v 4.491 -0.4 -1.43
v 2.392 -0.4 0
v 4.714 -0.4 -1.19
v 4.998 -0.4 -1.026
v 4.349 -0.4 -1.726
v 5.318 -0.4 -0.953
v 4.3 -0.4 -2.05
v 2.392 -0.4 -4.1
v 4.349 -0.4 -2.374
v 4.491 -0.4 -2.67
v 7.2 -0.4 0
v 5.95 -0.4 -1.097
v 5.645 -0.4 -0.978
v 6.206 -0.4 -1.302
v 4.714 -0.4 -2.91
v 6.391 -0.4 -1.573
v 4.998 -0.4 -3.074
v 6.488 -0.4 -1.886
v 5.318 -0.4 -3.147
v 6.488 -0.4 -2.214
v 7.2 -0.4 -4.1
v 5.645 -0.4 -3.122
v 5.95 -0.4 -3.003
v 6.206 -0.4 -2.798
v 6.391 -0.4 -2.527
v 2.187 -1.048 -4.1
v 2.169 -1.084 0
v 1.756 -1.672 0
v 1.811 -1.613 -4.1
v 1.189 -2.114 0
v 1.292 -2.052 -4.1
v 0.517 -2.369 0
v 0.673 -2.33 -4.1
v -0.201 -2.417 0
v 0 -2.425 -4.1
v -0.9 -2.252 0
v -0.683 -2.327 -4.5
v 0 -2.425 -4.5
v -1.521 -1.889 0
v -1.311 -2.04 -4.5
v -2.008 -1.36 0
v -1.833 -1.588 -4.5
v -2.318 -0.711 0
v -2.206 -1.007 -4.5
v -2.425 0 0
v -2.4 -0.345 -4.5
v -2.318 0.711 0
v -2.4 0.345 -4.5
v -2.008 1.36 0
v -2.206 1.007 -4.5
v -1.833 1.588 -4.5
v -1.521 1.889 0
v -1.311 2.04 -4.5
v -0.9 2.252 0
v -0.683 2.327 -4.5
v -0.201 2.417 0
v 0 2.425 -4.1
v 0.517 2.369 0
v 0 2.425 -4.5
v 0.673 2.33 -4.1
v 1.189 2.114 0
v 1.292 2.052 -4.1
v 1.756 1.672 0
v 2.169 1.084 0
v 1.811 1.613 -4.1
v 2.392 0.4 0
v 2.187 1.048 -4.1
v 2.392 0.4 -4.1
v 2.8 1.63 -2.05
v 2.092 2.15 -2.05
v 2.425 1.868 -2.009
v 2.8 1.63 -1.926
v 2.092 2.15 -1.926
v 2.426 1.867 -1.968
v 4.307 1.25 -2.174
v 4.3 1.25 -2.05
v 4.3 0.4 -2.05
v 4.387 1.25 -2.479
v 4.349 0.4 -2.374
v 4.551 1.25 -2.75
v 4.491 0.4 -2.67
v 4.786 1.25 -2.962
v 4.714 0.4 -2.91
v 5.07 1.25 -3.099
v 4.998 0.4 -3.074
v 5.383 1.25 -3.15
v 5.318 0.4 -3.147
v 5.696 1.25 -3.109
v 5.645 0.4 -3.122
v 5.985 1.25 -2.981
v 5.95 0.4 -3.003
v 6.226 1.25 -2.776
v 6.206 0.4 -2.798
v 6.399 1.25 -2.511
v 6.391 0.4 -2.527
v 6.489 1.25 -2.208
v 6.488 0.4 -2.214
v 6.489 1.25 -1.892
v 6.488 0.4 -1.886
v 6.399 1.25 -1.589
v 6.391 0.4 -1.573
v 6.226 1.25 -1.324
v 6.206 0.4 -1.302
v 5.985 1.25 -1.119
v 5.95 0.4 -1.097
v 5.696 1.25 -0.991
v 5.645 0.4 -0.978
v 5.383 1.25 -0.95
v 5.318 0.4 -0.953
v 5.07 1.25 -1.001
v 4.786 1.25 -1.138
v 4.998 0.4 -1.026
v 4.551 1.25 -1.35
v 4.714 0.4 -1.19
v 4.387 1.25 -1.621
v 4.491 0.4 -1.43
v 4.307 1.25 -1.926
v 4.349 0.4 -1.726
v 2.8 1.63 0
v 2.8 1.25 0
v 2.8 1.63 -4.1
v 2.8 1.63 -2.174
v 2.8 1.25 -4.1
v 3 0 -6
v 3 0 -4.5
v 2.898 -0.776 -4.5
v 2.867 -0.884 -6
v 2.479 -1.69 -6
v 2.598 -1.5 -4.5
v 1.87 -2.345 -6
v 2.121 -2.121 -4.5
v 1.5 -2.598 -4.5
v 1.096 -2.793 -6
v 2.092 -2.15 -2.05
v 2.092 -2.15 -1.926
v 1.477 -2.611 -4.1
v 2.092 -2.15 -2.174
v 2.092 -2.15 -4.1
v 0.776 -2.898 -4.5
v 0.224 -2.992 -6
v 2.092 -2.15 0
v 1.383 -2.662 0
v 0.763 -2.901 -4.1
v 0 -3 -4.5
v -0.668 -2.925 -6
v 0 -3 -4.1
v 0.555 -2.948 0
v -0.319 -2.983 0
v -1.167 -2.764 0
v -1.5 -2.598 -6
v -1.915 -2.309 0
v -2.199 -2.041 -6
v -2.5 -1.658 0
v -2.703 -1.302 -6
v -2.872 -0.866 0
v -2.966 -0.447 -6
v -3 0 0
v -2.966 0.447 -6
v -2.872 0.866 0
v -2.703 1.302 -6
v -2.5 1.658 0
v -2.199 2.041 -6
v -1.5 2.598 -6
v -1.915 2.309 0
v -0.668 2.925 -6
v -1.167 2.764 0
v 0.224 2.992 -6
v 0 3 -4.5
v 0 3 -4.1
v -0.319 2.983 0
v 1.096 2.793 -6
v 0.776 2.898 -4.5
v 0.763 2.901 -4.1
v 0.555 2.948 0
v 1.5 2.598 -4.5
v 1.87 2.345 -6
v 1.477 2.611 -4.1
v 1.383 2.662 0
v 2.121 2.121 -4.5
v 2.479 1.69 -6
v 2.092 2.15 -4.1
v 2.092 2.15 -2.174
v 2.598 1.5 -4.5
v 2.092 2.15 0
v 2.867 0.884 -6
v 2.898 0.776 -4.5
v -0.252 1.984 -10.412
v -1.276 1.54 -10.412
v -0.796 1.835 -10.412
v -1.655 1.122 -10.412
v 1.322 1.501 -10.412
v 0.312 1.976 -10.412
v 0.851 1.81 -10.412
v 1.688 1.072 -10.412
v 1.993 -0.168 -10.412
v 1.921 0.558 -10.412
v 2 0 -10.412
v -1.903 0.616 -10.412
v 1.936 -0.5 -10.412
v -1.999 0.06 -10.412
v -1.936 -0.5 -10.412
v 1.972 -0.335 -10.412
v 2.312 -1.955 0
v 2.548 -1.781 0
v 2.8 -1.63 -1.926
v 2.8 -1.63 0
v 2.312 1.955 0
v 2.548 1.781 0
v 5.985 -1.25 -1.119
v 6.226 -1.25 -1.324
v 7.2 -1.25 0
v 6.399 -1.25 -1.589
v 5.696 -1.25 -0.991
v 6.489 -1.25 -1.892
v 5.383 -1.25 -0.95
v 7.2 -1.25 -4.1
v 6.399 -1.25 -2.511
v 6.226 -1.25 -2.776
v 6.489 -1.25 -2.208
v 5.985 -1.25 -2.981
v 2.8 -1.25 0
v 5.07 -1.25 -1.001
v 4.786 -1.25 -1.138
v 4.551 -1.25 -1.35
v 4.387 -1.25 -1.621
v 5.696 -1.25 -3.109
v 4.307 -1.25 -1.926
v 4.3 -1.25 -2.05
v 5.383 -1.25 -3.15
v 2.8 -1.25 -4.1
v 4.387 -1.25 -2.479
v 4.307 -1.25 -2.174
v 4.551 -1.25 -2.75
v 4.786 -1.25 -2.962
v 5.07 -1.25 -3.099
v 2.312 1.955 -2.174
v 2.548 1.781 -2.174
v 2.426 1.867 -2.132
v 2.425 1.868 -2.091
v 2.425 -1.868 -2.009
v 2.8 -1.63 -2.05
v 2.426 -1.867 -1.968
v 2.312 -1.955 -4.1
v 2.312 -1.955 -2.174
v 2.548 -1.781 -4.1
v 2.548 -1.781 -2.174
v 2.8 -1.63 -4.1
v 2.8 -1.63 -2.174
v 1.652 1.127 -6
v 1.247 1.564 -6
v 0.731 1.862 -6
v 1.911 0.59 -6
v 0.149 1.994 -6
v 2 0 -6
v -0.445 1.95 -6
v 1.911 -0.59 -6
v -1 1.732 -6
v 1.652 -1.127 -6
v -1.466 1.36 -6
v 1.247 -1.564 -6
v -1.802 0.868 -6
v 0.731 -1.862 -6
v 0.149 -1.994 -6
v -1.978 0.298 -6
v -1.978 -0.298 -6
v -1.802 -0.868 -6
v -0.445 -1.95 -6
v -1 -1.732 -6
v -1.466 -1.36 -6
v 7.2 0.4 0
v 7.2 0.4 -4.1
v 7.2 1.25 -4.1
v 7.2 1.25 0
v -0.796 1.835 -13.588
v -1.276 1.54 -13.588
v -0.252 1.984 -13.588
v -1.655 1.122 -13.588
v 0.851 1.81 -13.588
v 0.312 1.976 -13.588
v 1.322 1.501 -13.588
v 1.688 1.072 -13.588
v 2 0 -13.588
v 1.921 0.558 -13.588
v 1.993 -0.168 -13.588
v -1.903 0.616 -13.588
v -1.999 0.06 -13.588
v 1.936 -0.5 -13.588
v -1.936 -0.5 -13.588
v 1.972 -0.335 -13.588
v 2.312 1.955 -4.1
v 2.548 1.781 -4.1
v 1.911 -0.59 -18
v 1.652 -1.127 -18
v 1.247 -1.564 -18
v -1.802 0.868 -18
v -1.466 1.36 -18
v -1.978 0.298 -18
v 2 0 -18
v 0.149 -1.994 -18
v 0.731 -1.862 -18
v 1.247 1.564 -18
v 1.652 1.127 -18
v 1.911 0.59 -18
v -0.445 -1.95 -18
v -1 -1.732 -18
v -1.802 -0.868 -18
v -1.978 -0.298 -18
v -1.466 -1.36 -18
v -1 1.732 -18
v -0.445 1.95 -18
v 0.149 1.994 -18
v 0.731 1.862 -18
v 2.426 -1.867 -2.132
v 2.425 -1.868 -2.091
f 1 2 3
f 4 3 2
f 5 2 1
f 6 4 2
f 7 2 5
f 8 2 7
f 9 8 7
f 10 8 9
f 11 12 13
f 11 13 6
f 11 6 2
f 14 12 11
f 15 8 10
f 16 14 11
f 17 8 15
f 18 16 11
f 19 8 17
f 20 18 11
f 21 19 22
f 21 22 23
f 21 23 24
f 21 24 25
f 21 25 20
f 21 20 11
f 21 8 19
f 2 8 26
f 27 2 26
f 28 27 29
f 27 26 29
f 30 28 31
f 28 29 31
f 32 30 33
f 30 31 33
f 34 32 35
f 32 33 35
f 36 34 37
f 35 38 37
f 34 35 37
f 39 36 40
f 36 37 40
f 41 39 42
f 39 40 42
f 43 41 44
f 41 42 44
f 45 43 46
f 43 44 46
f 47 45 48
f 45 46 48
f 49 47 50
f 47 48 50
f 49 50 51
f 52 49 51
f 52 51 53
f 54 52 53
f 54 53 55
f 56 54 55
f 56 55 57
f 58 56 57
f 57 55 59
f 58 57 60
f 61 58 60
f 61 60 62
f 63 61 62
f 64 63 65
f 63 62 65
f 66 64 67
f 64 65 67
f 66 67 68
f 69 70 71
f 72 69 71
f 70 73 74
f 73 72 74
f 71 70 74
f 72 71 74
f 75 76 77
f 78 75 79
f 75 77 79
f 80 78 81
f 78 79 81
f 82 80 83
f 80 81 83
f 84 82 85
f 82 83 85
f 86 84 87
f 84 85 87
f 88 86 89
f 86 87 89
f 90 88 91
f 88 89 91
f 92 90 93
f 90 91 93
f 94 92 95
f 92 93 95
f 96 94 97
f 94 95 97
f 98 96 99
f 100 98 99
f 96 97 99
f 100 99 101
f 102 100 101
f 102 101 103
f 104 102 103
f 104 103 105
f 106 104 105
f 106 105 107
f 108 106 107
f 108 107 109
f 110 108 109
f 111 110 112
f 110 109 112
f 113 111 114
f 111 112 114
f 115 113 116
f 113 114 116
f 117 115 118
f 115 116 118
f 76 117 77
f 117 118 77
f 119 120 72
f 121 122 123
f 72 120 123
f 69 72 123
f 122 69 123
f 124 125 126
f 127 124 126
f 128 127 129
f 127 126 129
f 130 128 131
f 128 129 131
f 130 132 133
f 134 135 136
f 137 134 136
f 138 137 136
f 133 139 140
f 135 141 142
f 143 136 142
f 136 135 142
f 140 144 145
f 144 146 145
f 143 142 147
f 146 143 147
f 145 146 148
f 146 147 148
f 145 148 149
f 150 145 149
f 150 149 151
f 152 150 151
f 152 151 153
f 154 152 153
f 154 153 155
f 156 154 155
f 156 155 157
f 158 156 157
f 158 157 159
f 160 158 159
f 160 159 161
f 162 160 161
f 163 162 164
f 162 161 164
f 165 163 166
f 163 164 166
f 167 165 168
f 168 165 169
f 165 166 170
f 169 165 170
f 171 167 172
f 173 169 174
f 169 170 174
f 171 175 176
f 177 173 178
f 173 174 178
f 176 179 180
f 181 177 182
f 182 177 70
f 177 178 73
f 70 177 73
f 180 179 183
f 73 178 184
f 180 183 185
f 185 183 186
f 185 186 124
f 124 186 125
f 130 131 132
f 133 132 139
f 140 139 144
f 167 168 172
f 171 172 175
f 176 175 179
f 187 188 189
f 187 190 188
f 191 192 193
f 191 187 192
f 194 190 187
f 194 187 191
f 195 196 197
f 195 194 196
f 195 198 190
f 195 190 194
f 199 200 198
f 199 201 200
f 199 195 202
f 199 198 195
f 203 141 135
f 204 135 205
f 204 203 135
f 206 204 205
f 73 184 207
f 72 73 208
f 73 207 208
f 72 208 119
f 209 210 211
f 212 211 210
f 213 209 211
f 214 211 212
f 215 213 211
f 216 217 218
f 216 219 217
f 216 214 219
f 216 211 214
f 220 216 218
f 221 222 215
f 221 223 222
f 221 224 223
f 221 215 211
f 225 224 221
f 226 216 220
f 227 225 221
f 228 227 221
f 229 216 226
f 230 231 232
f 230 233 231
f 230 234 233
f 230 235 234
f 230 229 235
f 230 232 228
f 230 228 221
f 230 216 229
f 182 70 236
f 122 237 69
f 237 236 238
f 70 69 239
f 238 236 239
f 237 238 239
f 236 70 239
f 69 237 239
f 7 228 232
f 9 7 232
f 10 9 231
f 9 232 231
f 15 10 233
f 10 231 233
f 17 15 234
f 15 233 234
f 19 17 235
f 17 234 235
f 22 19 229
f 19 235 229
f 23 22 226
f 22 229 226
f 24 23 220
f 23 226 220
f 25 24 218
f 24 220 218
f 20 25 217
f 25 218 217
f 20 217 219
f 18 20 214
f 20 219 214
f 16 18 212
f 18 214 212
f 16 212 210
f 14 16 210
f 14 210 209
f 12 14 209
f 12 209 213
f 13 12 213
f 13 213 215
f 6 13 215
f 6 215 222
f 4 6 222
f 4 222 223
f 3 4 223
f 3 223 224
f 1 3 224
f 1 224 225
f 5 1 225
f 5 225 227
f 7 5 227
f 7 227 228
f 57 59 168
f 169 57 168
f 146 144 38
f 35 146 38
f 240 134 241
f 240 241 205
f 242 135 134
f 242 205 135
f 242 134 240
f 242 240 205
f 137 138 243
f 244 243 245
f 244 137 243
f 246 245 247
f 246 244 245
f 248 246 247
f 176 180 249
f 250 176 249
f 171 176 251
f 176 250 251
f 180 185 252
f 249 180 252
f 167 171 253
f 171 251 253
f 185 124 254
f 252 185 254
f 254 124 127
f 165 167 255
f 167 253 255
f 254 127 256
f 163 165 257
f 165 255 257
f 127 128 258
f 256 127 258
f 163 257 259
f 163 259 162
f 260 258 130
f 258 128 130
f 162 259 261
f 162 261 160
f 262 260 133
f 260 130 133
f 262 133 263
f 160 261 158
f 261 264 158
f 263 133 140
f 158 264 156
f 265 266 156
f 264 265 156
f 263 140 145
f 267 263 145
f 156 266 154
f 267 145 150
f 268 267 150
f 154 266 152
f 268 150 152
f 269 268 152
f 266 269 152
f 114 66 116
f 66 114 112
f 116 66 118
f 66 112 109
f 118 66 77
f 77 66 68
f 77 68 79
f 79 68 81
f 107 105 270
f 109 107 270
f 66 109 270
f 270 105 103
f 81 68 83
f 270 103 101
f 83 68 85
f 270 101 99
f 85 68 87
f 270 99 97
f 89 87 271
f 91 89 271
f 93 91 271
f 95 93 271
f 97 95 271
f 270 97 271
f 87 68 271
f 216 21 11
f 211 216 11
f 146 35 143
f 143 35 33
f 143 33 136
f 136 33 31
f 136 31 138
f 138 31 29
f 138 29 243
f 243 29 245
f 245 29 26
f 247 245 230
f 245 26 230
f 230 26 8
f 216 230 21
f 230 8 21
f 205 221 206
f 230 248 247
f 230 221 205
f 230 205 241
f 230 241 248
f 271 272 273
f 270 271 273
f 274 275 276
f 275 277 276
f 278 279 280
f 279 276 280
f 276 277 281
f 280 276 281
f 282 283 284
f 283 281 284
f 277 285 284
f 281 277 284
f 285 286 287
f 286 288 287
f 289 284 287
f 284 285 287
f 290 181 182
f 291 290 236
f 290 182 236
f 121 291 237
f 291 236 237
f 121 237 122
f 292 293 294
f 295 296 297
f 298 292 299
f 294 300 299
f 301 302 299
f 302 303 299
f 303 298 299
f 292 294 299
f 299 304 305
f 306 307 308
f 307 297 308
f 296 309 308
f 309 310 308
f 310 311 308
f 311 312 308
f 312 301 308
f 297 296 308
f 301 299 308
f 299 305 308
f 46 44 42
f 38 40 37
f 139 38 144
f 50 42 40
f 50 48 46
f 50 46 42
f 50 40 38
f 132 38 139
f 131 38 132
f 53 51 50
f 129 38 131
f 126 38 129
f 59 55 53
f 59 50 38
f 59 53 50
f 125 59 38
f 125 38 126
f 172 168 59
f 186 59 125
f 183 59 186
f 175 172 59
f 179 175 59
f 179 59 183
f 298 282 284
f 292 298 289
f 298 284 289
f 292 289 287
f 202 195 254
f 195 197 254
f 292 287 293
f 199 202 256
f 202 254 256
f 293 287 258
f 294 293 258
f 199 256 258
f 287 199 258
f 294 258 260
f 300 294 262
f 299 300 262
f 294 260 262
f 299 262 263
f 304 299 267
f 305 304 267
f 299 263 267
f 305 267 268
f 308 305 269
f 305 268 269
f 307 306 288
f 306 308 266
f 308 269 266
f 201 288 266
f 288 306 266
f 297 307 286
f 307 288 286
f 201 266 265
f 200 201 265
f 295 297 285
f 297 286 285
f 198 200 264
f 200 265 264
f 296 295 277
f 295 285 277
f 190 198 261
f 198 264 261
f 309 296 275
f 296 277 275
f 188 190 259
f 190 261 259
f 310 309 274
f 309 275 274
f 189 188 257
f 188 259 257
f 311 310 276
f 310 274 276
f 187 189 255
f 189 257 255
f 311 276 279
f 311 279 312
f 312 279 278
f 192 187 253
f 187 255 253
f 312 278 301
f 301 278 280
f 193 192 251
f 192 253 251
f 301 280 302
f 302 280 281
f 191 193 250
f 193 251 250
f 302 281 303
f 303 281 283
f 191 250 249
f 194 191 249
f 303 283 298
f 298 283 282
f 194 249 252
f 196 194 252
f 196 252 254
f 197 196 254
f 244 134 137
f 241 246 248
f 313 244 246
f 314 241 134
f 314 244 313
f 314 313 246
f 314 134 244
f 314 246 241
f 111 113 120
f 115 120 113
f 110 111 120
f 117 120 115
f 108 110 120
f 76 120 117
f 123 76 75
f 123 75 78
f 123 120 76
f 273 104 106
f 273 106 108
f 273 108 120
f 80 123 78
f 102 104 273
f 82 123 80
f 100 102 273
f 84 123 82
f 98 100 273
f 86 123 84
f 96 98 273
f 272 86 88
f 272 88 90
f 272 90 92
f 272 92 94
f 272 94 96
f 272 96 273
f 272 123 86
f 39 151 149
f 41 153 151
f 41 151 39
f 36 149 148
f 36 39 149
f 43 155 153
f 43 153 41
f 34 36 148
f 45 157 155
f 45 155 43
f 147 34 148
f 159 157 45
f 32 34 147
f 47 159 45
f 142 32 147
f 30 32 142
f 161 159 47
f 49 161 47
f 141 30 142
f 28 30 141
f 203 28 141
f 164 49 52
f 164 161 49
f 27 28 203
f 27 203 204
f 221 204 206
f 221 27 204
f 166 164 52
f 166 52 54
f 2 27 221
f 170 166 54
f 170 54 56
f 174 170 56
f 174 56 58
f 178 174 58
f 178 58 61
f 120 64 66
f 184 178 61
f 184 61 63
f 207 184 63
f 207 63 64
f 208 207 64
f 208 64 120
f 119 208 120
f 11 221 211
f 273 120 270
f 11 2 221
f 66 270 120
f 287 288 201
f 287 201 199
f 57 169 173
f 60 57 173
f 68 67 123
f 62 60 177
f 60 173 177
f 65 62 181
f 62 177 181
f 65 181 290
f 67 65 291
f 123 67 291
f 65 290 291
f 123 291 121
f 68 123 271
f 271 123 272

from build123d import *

# Parameters (mm, degrees)
BOSS_EXTRUDE3_DEPTH     = 1.25
SKETCH6_W               = 7.2
SKETCH6_H               = 4.5
CUT_EXTRUDE1_DEPTH      = 0.4
CUT_EXTRUDE2_START      = -4.5
SKETCH7_W               = 8
SKETCH7_H               = 10
CUT_EXTRUDE2_DEPTH      = 0.4
M2_CLEARANCE_HOLE1_D    = 2.2
CUT_EXTRUDE3_DEPTH      = 20.617339269
CUT_EXTRUDE3_DEPTH_BACK = 0.5
SKETCH10_W              = 10
SKETCH10_H              = 3.175
FILLET1_R               = 3.175
CUT_EXTRUDE4_REACH      = 21.847
CUT_EXTRUDE4_END_RADIUS = 3.175
SKETCH12_W              = 4.4
SKETCH12_H              = 4.1


with BuildPart() as part:
    # Sketch3 → Revolve1 (revolve)
    with BuildSketch(Plane(origin=(0, 0, 0), x_dir=(0, 0, -1), z_dir=(1, 0, 0)), mode=Mode.PRIVATE) as revolve1_sk:
        Polygon((18, 0), (18, 2), (6, 2), (6, 3), (0, 3), (0, 2.425), (4.5, 2.425), (4.5, 0), align=None)
    revolve(revolve1_sk.sketch.rotate(Axis((0, 0, 12.785862786), (0, 0, -1)), 90), axis=Axis((0, 0, 12.785862786), (0, 0, -1)))

    # Sketch5 → Boss-Extrude3 (add, symmetric)
    with BuildSketch(Plane(origin=(0, 0, 0), x_dir=(1, 0, 0), z_dir=(0, 1, 0))):
        Polygon((3, 4.5), (7.2, 4.5), (7.2, 0), (3, 0), (2.425, 0), (2.425, 4.5), align=None)
    extrude(amount=BOSS_EXTRUDE3_DEPTH, both=True)

    # Sketch6 → Cut-Extrude1 (cut, symmetric)
    with BuildSketch(Plane(origin=(0, 0, 0), x_dir=(1, 0, 0), z_dir=(0, 1, 0))):
        with Locations((3.6, 2.25)):
            Rectangle(SKETCH6_W, SKETCH6_H)
    extrude(amount=CUT_EXTRUDE1_DEPTH, both=True, mode=Mode.SUBTRACT)

    # Sketch7 → Cut-Extrude2 (cut)
    with BuildSketch(Plane.XY.offset(CUT_EXTRUDE2_START)):
        with Locations((4, 0)):
            Rectangle(SKETCH7_W, SKETCH7_H)
    extrude(amount=CUT_EXTRUDE2_DEPTH, mode=Mode.SUBTRACT)

    # M2 Clearance Hole1 (through all)
    with Locations(Plane(origin=(0, 1.25, 0), x_dir=(1, 0, 0), z_dir=(0, 1, 0))):
        with Locations((5.4, 2.05)):
            Hole(M2_CLEARANCE_HOLE1_D / 2)

    # Sketch10 → Cut-Extrude3 (cut, two sides: drawn at the far end of the back side and taken through both)
    with BuildSketch(Plane(origin=(0, 0, 0), x_dir=(1, 0, 0), z_dir=(0, 1, 0)).offset(-CUT_EXTRUDE3_DEPTH_BACK)):
        with Locations((0, 12)):
            Rectangle(SKETCH10_W, SKETCH10_H)
    extrude(amount=CUT_EXTRUDE3_DEPTH + CUT_EXTRUDE3_DEPTH_BACK, mode=Mode.SUBTRACT)

    # Fillet1
    fillet1_edges = [part.edges().sort_by_distance(p)[0] for p in [
        (2.727178029, -1.25, -2.05),
        (2.727178029, 1.25, -2.05),
    ]]
    fillet(fillet1_edges, radius=FILLET1_R)

    # Cut-Extrude4: up to this cylinder (the profile starts outside it)
    cut_extrude4_end = Plane(origin=(4.306971093, 4.425, -2.05), z_dir=(0, 0, 1)) * Cylinder(CUT_EXTRUDE4_END_RADIUS, 51.044, mode=Mode.PRIVATE)
    # Sketch12 → Cut-Extrude4 (cut, up to the surface)
    with BuildSketch(Plane(origin=(0, 1.25, 0), x_dir=(1, 0, 0), z_dir=(0, 1, 0)), mode=Mode.PRIVATE) as cut_extrude4_sk1:
        with Locations((5, 2.05)):
            Rectangle(SKETCH12_W, SKETCH12_H)
    cut_extrude4_tool1 = extrude(cut_extrude4_sk1.sketch, amount=CUT_EXTRUDE4_REACH, mode=Mode.PRIVATE) - cut_extrude4_end
    cut_extrude4 = cut_extrude4_tool1.solids().sort_by_distance((5, 1.25, -2.05))[0] + cut_extrude4_tool1.solids().sort_by_distance((5, 1.25, -2.05))[1]
    add(cut_extrude4, mode=Mode.SUBTRACT)

    # Mirror1: Cut-Extrude4 across plane
    add(cut_extrude4.mirror(Plane.ZX), mode=Mode.SUBTRACT)


solid = part.part
